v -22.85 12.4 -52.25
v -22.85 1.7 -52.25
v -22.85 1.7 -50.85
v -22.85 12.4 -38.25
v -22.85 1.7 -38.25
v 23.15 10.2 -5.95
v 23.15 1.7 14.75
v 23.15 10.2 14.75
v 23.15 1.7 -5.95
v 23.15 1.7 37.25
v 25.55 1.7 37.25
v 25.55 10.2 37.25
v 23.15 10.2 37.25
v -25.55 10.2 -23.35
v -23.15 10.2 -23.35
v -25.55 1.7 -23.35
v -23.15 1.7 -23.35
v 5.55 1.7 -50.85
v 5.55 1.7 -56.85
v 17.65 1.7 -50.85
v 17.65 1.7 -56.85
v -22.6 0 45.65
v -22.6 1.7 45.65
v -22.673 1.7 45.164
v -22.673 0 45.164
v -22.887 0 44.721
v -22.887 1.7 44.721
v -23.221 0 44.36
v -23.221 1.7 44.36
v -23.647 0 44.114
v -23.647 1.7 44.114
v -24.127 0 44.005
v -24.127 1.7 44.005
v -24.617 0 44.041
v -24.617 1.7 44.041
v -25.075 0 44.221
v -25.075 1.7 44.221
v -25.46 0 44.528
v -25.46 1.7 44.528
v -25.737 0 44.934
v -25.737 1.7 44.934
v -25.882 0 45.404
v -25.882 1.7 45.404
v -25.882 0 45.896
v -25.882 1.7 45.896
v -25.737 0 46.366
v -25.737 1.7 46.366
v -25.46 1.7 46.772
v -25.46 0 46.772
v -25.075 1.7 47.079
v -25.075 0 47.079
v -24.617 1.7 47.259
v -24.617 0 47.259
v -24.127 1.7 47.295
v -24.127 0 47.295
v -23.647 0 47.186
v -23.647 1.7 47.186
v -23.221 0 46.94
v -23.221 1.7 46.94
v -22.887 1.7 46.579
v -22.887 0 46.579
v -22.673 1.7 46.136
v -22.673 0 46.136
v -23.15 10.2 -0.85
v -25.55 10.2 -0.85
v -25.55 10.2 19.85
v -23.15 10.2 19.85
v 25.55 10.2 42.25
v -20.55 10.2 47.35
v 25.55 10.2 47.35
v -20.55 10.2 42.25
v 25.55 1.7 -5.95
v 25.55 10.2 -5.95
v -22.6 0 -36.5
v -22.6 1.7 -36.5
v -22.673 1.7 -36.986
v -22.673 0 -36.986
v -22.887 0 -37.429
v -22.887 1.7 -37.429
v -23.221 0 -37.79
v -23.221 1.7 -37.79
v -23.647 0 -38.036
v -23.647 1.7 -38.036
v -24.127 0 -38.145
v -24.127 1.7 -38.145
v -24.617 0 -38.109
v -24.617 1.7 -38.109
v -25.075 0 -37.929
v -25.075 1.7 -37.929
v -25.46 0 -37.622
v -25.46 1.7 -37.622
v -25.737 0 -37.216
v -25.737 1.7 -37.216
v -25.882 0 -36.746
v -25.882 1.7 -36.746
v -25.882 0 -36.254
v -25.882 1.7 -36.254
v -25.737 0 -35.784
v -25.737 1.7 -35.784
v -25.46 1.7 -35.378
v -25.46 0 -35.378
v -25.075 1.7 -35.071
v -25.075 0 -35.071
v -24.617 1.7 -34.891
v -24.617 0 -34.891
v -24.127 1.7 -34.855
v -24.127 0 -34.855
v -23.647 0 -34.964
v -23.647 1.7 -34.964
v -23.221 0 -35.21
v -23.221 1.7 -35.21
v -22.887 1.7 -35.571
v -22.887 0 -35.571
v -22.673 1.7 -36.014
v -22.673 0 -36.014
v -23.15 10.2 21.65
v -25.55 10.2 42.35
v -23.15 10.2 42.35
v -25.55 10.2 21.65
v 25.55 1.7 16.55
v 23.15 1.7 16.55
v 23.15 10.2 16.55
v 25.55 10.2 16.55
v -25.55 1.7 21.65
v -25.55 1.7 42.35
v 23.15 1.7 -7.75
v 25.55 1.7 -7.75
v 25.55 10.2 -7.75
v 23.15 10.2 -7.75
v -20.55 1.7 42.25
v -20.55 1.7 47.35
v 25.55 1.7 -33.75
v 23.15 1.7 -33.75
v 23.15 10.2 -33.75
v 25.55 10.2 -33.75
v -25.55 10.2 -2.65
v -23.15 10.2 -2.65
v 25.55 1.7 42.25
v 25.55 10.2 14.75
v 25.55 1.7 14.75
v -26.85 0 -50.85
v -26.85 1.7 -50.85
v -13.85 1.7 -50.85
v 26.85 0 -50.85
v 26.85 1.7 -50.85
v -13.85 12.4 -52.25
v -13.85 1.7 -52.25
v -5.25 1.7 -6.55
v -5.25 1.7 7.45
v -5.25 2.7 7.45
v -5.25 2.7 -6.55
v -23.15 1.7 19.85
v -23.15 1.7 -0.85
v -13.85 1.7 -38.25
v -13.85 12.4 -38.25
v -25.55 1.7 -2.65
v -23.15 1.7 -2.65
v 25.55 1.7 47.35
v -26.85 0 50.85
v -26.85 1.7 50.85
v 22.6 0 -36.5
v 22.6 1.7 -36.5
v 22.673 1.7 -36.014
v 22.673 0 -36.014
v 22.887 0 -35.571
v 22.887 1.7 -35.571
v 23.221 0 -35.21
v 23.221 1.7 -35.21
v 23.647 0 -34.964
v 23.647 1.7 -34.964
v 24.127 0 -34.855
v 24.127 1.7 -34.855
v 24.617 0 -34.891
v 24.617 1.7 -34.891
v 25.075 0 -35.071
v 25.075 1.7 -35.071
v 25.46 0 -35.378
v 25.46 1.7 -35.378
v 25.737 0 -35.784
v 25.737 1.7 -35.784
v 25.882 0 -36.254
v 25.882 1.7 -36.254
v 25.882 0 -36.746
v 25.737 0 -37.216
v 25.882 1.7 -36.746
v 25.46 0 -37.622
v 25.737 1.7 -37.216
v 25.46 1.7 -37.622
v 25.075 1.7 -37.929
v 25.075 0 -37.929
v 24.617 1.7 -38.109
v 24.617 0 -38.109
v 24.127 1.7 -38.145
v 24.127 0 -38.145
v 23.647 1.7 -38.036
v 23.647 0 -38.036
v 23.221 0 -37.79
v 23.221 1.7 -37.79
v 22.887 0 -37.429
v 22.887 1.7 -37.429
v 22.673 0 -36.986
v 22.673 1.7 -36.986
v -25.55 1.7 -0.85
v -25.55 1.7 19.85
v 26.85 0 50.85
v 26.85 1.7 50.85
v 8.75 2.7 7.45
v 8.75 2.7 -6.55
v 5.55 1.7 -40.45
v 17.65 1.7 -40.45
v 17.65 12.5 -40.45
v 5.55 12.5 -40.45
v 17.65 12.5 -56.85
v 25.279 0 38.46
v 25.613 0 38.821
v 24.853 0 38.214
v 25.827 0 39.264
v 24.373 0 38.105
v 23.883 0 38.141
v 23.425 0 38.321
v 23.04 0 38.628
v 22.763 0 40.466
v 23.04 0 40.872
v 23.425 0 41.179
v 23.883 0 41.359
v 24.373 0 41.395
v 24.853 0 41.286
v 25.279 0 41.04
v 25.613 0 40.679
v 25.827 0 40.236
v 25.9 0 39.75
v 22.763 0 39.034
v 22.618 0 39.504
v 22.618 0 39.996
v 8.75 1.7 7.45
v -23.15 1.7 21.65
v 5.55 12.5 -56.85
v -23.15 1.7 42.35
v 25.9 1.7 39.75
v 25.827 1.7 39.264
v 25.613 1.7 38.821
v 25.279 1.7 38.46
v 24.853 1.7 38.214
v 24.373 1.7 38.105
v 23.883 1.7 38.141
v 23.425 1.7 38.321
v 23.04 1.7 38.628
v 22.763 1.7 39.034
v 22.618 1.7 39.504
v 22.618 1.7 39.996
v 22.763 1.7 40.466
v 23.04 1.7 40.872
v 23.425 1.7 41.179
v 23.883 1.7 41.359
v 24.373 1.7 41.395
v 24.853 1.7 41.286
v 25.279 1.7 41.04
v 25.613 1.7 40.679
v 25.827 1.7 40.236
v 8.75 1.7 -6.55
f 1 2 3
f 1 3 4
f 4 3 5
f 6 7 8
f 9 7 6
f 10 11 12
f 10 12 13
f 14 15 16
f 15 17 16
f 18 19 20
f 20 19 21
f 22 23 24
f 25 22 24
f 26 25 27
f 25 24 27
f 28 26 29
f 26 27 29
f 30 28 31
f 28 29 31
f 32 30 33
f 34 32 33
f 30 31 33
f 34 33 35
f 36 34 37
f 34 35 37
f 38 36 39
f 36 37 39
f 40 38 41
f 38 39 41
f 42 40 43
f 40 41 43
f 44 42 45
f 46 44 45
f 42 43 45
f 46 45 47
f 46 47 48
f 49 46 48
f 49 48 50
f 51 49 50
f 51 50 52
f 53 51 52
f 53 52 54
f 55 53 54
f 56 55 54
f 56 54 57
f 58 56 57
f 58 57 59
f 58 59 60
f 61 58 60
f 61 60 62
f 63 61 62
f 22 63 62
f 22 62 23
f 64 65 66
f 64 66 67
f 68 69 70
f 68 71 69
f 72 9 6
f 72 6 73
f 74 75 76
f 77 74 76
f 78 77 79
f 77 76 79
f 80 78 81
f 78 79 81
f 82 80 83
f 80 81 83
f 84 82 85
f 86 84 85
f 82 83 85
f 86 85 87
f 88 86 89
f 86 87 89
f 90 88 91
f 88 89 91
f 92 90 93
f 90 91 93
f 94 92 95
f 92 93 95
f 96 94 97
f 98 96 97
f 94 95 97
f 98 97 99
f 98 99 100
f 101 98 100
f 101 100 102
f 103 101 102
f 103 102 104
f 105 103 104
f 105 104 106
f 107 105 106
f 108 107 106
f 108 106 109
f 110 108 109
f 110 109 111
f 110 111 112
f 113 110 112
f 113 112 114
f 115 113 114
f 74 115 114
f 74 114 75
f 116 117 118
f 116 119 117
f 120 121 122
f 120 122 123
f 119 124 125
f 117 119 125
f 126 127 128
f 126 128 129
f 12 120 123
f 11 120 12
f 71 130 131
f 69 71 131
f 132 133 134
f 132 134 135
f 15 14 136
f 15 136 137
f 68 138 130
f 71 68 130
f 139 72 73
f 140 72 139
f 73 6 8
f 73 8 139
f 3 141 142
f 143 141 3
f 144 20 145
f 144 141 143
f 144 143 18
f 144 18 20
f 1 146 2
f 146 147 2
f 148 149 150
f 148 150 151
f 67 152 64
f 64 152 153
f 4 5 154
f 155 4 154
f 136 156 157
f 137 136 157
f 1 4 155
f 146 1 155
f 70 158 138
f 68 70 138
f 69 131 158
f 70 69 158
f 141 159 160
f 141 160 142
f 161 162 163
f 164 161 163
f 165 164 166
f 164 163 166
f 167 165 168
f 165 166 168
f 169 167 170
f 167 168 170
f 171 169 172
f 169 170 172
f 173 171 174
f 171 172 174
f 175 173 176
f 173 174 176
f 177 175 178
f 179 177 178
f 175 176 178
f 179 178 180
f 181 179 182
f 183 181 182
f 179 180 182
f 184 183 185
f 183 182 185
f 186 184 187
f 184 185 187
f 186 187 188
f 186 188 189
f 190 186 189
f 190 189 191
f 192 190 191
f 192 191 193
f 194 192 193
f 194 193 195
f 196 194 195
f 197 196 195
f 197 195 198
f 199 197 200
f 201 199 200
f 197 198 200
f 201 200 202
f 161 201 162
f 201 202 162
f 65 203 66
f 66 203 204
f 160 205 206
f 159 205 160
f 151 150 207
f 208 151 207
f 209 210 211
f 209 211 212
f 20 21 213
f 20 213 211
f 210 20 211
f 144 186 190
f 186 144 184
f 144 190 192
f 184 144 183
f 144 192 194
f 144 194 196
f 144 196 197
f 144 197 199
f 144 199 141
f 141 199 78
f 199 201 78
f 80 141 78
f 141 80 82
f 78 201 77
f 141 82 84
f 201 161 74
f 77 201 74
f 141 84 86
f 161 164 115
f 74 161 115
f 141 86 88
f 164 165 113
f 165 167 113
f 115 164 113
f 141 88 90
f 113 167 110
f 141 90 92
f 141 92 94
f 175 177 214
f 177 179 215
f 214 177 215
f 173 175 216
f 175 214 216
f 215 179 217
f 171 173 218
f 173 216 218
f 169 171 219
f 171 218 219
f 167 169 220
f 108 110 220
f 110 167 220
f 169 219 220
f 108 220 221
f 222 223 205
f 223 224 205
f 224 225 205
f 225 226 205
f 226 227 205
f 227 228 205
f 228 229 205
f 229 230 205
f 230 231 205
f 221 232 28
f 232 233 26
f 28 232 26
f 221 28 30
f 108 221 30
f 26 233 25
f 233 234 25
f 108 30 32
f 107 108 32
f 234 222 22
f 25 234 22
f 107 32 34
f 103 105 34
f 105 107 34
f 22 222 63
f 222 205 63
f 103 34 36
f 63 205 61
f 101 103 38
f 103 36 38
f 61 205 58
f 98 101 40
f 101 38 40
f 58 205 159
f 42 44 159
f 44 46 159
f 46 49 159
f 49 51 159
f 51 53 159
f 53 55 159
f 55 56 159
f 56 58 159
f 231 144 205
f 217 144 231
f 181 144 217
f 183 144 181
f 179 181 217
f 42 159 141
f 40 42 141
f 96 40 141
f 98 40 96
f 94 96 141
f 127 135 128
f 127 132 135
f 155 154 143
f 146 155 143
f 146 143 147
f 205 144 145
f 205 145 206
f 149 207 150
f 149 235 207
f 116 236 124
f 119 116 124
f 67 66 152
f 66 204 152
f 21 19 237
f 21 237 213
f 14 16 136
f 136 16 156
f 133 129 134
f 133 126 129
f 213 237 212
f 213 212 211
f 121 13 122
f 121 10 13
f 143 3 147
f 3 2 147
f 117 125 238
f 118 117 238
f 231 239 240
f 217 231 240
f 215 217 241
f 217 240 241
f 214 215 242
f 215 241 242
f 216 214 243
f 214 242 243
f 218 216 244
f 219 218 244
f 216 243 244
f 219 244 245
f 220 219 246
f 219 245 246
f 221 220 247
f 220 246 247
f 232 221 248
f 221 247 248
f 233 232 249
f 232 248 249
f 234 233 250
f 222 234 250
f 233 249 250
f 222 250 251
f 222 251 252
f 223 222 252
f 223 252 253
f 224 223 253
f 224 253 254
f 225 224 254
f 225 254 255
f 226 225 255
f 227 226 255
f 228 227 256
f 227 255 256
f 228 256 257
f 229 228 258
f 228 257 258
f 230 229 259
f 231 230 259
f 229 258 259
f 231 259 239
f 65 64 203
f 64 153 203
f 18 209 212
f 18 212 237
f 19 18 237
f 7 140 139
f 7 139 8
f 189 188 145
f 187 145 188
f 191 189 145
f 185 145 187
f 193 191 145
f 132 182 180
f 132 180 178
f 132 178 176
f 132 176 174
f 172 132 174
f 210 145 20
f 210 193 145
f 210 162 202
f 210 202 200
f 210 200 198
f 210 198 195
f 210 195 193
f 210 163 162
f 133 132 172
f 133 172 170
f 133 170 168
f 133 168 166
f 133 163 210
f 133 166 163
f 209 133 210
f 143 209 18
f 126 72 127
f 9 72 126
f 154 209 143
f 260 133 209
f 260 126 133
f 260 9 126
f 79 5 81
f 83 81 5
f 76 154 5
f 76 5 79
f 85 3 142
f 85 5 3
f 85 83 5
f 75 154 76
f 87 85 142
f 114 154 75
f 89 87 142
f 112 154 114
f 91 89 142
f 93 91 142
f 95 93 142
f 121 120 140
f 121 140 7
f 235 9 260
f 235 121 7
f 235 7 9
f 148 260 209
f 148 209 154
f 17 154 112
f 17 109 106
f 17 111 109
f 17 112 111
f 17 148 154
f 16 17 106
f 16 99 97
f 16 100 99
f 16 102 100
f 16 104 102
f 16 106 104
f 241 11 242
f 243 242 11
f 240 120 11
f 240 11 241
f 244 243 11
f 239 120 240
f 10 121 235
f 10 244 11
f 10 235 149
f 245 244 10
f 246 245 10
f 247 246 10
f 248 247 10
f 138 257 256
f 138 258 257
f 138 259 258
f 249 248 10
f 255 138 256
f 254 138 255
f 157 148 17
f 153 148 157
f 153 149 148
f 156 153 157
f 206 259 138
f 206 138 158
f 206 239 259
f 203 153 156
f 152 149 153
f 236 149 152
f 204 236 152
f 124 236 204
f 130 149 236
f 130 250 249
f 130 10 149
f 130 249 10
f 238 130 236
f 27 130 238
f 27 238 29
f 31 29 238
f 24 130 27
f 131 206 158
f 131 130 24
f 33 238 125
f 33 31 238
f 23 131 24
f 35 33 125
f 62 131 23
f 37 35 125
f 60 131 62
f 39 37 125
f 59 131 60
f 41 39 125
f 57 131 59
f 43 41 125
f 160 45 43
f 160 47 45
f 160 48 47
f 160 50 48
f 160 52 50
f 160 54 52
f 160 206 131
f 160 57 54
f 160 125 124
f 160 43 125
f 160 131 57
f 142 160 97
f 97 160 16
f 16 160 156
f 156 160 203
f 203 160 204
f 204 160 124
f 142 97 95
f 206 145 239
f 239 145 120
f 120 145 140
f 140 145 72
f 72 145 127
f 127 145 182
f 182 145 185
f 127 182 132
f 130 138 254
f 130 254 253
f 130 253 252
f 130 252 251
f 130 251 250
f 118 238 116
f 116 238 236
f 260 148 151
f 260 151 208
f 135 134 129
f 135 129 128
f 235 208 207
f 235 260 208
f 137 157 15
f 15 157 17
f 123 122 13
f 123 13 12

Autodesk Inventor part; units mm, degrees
ref_plane "YZ Plane" through (0, 0, 0) normal (1, 0, 0) x (0, 1, 0)
ref_plane "XZ Plane" through (0, 0, 0) normal (0, 1, 0) x (-1, 0, 0)
ref_plane "XY Plane" through (0, 0, 0) normal (0, 0, 1) x (1, 0, 0)
sketch "Sketch1" plane through (0, 0, 0) normal (0, 1, 0) x (-1, 0, 0)
  line L0 (-26.85, 50.85) -> (26.85, 50.85)
  line L1 (26.85, 50.85) -> (26.85, -50.85)
  line L2 (26.85, -50.85) -> (-26.85, -50.85)
  line L3 (-26.85, -50.85) -> (-26.85, 50.85)
  line L4 (-26.85, 50.85) -> (26.85, -50.85) construction
  line L5 (26.85, 50.85) -> (-26.85, -50.85) construction
  point P0 (0, 0)
  dimension "d0" = 53.7
  dimension "d1" = 101.7
extrude "Extrusion1" add sketch "Sketch1" along normal blind 1.7
sketch "Sketch2" plane through (0, 1.7, 0) normal (0, 1, 0) x (1, 0, 0)
  line L0 (26.85, 50.85) -> (-26.85, 50.85) projected
  line L1 (-26.85, 50.85) -> (-26.85, -50.85) projected
  line L2 (-22.85, 38.25) -> (-13.85, 38.25)
  line L3 (-13.85, 38.25) -> (-13.85, 52.25)
  line L4 (-13.85, 52.25) -> (-22.85, 52.25)
  line L5 (-22.85, 52.25) -> (-22.85, 38.25)
  point P0 (0, 0)
  dimension "d6" = 9
  dimension "d7" = 14
extrude "Extrusion2" add sketch "Sketch2" along normal blind 10.7
sketch "Sketch3" plane through (0, 1.7, 0) normal (0, 1, 0) x (1, 0, 0)
  line L0 (26.85, 50.85) -> (-26.85, 50.85) projected
  line L1 (17.65, 40.45) -> (5.55, 40.45)
  line L2 (5.55, 40.45) -> (5.55, 56.85)
  line L3 (5.55, 56.85) -> (17.65, 56.85)
  line L4 (17.65, 56.85) -> (17.65, 40.45)
  point P0 (0, 0)
  dimension "d12" = 12.1
  dimension "d13" = 16.4
extrude "Extrusion3" add sketch "Sketch3" along normal blind 10.8
sketch "Sketch4" plane through (0, 1.7, 0) normal (0, 1, 0) x (1, 0, 0)
  line L0 (-26.85, -50.85) -> (26.85, -50.85) projected
  line L1 (-26.85, 50.85) -> (-26.85, -50.85) projected
  line L2 (-20.55, -47.35) -> (25.55, -47.35)
  line L3 (25.55, -47.35) -> (25.55, -42.25)
  line L4 (25.55, -42.25) -> (-20.55, -42.25)
  line L5 (-20.55, -42.25) -> (-20.55, -47.35)
  point P0 (0, 0)
  dimension "d18" = 46.1
  dimension "d19" = 5.1
extrude "Extrusion4" add sketch "Sketch4" along normal blind 8.5
sketch "Sketch5" plane through (0, 1.7, 0) normal (0, 1, 0) x (1, 0, 0)
  line L0 (-26.85, -50.85) -> (26.85, -50.85) projected
  line L1 (-25.55, -42.35) -> (-23.15, -42.35)
  line L2 (-23.15, -42.35) -> (-23.15, -21.65)
  line L3 (-23.15, -21.65) -> (-25.55, -21.65)
  line L4 (-25.55, -21.65) -> (-25.55, -42.35)
  line L5 (-25.55, -19.85) -> (-23.15, -19.85)
  line L6 (-23.15, -19.85) -> (-23.15, 0.85)
  line L7 (-23.15, 0.85) -> (-25.55, 0.85)
  line L8 (-25.55, 0.85) -> (-25.55, -19.85)
  line L9 (-25.55, 2.65) -> (-23.15, 2.65)
  line L10 (-23.15, 2.65) -> (-23.15, 23.35)
  line L11 (-23.15, 23.35) -> (-25.55, 23.35)
  line L12 (-25.55, 23.35) -> (-25.55, 2.65)
  line L13 (25.55, -37.25) -> (23.15, -37.25)
  line L14 (23.15, -37.25) -> (23.15, -16.55)
  line L15 (23.15, -16.55) -> (25.55, -16.55)
  line L16 (25.55, -16.55) -> (25.55, -37.25)
  line L17 (25.55, -14.75) -> (23.15, -14.75)
  line L18 (23.15, -14.75) -> (23.15, 5.95)
  line L19 (23.15, 5.95) -> (25.55, 5.95)
  line L20 (25.55, 5.95) -> (25.55, -14.75)
  line L21 (25.55, 7.75) -> (23.15, 7.75)
  line L22 (23.15, 7.75) -> (23.15, 33.75)
  line L23 (23.15, 33.75) -> (25.55, 33.75)
  line L24 (25.55, 33.75) -> (25.55, 7.75)
  point P0 (0, 0)
  dimension "d24" = 2.4
  dimension "d25" = 20.7
  dimension "d26" = 1.8
  dimension "d27" = 20.7
  dimension "d28" = 1.8
  dimension "d29" = 20.7
  dimension "d32" = 2.4
  dimension "d33" = 20.7
  dimension "d34" = 1.8
  dimension "d35" = 20.7
  dimension "d36" = 1.8
  dimension "d37" = 26
extrude "Extrusion5" add sketch "Sketch5" along normal blind 8.5
sketch "Sketch6" plane through (0, 1.7, 0) normal (0, 1, 0) x (1, 0, 0)
  line L0 (-22.85, 50.85) -> (-26.85, 50.85) projected
  line L1 (-26.85, 50.85) -> (-26.85, -50.85) projected
  line L2 (-5.25, 6.55) -> (8.75, 6.55)
  line L3 (8.75, 6.55) -> (8.75, -7.45)
  line L4 (8.75, -7.45) -> (-5.25, -7.45)
  line L5 (-5.25, -7.45) -> (-5.25, 6.55)
  point P0 (0, 0)
  dimension "d42" = 14
  dimension "d43" = 14
extrude "Extrusion6" add sketch "Sketch6" along normal blind 1
sketch "Sketch7" plane through (0, 1.7, 0) normal (0, 1, 0) x (1, 0, 0)
  circle A0 centre (-24.25, 36.5) radius 1.65
  point P0 (0, 0)
  point P1 (-26.85, 50.85)
  dimension "d48" = 3.3
  dimension "d64" = 14.35
extrude "Extrusion7" cut sketch "Sketch7" against normal blind 2
mirror "Mirror1" about plane through (0, 0, 0) normal (1, 0, 0) of "Extrusion7"
sketch "Sketch8" plane through (0, 1.7, 0) normal (0, 1, 0) x (1, 0, 0)
  line L0 (-26.85, -50.85) -> (26.85, -50.85) projected
  line L1 (-26.85, 50.85) -> (-26.85, -50.85) projected
  circle A0 centre (-24.25, -45.65) radius 1.65
  point P0 (0, 0)
  dimension "d53" = 3.3
  dimension "d63" = 96.5
extrude "Extrusion8" cut sketch "Sketch8" against normal blind 2
sketch "Sketch9" plane through (0, 1.7, 0) normal (0, 1, 0) x (1, 0, 0)
  line L0 (23.15, 5.95) -> (23.15, -14.75) projected
  circle A0 centre (24.25, -39.75) radius 1.65
  line L1 (23.15, -37.25) -> (25.55, -37.25) projected
  point P0 (0, 0)
  point P1 (26.85, 50.85)
  dimension "d59" = 3.3
  dimension "d60" = 2.5
extrude "Extrusion9" cut sketch "Sketch9" against normal blind 2
properties part number "ArduinoMega"
